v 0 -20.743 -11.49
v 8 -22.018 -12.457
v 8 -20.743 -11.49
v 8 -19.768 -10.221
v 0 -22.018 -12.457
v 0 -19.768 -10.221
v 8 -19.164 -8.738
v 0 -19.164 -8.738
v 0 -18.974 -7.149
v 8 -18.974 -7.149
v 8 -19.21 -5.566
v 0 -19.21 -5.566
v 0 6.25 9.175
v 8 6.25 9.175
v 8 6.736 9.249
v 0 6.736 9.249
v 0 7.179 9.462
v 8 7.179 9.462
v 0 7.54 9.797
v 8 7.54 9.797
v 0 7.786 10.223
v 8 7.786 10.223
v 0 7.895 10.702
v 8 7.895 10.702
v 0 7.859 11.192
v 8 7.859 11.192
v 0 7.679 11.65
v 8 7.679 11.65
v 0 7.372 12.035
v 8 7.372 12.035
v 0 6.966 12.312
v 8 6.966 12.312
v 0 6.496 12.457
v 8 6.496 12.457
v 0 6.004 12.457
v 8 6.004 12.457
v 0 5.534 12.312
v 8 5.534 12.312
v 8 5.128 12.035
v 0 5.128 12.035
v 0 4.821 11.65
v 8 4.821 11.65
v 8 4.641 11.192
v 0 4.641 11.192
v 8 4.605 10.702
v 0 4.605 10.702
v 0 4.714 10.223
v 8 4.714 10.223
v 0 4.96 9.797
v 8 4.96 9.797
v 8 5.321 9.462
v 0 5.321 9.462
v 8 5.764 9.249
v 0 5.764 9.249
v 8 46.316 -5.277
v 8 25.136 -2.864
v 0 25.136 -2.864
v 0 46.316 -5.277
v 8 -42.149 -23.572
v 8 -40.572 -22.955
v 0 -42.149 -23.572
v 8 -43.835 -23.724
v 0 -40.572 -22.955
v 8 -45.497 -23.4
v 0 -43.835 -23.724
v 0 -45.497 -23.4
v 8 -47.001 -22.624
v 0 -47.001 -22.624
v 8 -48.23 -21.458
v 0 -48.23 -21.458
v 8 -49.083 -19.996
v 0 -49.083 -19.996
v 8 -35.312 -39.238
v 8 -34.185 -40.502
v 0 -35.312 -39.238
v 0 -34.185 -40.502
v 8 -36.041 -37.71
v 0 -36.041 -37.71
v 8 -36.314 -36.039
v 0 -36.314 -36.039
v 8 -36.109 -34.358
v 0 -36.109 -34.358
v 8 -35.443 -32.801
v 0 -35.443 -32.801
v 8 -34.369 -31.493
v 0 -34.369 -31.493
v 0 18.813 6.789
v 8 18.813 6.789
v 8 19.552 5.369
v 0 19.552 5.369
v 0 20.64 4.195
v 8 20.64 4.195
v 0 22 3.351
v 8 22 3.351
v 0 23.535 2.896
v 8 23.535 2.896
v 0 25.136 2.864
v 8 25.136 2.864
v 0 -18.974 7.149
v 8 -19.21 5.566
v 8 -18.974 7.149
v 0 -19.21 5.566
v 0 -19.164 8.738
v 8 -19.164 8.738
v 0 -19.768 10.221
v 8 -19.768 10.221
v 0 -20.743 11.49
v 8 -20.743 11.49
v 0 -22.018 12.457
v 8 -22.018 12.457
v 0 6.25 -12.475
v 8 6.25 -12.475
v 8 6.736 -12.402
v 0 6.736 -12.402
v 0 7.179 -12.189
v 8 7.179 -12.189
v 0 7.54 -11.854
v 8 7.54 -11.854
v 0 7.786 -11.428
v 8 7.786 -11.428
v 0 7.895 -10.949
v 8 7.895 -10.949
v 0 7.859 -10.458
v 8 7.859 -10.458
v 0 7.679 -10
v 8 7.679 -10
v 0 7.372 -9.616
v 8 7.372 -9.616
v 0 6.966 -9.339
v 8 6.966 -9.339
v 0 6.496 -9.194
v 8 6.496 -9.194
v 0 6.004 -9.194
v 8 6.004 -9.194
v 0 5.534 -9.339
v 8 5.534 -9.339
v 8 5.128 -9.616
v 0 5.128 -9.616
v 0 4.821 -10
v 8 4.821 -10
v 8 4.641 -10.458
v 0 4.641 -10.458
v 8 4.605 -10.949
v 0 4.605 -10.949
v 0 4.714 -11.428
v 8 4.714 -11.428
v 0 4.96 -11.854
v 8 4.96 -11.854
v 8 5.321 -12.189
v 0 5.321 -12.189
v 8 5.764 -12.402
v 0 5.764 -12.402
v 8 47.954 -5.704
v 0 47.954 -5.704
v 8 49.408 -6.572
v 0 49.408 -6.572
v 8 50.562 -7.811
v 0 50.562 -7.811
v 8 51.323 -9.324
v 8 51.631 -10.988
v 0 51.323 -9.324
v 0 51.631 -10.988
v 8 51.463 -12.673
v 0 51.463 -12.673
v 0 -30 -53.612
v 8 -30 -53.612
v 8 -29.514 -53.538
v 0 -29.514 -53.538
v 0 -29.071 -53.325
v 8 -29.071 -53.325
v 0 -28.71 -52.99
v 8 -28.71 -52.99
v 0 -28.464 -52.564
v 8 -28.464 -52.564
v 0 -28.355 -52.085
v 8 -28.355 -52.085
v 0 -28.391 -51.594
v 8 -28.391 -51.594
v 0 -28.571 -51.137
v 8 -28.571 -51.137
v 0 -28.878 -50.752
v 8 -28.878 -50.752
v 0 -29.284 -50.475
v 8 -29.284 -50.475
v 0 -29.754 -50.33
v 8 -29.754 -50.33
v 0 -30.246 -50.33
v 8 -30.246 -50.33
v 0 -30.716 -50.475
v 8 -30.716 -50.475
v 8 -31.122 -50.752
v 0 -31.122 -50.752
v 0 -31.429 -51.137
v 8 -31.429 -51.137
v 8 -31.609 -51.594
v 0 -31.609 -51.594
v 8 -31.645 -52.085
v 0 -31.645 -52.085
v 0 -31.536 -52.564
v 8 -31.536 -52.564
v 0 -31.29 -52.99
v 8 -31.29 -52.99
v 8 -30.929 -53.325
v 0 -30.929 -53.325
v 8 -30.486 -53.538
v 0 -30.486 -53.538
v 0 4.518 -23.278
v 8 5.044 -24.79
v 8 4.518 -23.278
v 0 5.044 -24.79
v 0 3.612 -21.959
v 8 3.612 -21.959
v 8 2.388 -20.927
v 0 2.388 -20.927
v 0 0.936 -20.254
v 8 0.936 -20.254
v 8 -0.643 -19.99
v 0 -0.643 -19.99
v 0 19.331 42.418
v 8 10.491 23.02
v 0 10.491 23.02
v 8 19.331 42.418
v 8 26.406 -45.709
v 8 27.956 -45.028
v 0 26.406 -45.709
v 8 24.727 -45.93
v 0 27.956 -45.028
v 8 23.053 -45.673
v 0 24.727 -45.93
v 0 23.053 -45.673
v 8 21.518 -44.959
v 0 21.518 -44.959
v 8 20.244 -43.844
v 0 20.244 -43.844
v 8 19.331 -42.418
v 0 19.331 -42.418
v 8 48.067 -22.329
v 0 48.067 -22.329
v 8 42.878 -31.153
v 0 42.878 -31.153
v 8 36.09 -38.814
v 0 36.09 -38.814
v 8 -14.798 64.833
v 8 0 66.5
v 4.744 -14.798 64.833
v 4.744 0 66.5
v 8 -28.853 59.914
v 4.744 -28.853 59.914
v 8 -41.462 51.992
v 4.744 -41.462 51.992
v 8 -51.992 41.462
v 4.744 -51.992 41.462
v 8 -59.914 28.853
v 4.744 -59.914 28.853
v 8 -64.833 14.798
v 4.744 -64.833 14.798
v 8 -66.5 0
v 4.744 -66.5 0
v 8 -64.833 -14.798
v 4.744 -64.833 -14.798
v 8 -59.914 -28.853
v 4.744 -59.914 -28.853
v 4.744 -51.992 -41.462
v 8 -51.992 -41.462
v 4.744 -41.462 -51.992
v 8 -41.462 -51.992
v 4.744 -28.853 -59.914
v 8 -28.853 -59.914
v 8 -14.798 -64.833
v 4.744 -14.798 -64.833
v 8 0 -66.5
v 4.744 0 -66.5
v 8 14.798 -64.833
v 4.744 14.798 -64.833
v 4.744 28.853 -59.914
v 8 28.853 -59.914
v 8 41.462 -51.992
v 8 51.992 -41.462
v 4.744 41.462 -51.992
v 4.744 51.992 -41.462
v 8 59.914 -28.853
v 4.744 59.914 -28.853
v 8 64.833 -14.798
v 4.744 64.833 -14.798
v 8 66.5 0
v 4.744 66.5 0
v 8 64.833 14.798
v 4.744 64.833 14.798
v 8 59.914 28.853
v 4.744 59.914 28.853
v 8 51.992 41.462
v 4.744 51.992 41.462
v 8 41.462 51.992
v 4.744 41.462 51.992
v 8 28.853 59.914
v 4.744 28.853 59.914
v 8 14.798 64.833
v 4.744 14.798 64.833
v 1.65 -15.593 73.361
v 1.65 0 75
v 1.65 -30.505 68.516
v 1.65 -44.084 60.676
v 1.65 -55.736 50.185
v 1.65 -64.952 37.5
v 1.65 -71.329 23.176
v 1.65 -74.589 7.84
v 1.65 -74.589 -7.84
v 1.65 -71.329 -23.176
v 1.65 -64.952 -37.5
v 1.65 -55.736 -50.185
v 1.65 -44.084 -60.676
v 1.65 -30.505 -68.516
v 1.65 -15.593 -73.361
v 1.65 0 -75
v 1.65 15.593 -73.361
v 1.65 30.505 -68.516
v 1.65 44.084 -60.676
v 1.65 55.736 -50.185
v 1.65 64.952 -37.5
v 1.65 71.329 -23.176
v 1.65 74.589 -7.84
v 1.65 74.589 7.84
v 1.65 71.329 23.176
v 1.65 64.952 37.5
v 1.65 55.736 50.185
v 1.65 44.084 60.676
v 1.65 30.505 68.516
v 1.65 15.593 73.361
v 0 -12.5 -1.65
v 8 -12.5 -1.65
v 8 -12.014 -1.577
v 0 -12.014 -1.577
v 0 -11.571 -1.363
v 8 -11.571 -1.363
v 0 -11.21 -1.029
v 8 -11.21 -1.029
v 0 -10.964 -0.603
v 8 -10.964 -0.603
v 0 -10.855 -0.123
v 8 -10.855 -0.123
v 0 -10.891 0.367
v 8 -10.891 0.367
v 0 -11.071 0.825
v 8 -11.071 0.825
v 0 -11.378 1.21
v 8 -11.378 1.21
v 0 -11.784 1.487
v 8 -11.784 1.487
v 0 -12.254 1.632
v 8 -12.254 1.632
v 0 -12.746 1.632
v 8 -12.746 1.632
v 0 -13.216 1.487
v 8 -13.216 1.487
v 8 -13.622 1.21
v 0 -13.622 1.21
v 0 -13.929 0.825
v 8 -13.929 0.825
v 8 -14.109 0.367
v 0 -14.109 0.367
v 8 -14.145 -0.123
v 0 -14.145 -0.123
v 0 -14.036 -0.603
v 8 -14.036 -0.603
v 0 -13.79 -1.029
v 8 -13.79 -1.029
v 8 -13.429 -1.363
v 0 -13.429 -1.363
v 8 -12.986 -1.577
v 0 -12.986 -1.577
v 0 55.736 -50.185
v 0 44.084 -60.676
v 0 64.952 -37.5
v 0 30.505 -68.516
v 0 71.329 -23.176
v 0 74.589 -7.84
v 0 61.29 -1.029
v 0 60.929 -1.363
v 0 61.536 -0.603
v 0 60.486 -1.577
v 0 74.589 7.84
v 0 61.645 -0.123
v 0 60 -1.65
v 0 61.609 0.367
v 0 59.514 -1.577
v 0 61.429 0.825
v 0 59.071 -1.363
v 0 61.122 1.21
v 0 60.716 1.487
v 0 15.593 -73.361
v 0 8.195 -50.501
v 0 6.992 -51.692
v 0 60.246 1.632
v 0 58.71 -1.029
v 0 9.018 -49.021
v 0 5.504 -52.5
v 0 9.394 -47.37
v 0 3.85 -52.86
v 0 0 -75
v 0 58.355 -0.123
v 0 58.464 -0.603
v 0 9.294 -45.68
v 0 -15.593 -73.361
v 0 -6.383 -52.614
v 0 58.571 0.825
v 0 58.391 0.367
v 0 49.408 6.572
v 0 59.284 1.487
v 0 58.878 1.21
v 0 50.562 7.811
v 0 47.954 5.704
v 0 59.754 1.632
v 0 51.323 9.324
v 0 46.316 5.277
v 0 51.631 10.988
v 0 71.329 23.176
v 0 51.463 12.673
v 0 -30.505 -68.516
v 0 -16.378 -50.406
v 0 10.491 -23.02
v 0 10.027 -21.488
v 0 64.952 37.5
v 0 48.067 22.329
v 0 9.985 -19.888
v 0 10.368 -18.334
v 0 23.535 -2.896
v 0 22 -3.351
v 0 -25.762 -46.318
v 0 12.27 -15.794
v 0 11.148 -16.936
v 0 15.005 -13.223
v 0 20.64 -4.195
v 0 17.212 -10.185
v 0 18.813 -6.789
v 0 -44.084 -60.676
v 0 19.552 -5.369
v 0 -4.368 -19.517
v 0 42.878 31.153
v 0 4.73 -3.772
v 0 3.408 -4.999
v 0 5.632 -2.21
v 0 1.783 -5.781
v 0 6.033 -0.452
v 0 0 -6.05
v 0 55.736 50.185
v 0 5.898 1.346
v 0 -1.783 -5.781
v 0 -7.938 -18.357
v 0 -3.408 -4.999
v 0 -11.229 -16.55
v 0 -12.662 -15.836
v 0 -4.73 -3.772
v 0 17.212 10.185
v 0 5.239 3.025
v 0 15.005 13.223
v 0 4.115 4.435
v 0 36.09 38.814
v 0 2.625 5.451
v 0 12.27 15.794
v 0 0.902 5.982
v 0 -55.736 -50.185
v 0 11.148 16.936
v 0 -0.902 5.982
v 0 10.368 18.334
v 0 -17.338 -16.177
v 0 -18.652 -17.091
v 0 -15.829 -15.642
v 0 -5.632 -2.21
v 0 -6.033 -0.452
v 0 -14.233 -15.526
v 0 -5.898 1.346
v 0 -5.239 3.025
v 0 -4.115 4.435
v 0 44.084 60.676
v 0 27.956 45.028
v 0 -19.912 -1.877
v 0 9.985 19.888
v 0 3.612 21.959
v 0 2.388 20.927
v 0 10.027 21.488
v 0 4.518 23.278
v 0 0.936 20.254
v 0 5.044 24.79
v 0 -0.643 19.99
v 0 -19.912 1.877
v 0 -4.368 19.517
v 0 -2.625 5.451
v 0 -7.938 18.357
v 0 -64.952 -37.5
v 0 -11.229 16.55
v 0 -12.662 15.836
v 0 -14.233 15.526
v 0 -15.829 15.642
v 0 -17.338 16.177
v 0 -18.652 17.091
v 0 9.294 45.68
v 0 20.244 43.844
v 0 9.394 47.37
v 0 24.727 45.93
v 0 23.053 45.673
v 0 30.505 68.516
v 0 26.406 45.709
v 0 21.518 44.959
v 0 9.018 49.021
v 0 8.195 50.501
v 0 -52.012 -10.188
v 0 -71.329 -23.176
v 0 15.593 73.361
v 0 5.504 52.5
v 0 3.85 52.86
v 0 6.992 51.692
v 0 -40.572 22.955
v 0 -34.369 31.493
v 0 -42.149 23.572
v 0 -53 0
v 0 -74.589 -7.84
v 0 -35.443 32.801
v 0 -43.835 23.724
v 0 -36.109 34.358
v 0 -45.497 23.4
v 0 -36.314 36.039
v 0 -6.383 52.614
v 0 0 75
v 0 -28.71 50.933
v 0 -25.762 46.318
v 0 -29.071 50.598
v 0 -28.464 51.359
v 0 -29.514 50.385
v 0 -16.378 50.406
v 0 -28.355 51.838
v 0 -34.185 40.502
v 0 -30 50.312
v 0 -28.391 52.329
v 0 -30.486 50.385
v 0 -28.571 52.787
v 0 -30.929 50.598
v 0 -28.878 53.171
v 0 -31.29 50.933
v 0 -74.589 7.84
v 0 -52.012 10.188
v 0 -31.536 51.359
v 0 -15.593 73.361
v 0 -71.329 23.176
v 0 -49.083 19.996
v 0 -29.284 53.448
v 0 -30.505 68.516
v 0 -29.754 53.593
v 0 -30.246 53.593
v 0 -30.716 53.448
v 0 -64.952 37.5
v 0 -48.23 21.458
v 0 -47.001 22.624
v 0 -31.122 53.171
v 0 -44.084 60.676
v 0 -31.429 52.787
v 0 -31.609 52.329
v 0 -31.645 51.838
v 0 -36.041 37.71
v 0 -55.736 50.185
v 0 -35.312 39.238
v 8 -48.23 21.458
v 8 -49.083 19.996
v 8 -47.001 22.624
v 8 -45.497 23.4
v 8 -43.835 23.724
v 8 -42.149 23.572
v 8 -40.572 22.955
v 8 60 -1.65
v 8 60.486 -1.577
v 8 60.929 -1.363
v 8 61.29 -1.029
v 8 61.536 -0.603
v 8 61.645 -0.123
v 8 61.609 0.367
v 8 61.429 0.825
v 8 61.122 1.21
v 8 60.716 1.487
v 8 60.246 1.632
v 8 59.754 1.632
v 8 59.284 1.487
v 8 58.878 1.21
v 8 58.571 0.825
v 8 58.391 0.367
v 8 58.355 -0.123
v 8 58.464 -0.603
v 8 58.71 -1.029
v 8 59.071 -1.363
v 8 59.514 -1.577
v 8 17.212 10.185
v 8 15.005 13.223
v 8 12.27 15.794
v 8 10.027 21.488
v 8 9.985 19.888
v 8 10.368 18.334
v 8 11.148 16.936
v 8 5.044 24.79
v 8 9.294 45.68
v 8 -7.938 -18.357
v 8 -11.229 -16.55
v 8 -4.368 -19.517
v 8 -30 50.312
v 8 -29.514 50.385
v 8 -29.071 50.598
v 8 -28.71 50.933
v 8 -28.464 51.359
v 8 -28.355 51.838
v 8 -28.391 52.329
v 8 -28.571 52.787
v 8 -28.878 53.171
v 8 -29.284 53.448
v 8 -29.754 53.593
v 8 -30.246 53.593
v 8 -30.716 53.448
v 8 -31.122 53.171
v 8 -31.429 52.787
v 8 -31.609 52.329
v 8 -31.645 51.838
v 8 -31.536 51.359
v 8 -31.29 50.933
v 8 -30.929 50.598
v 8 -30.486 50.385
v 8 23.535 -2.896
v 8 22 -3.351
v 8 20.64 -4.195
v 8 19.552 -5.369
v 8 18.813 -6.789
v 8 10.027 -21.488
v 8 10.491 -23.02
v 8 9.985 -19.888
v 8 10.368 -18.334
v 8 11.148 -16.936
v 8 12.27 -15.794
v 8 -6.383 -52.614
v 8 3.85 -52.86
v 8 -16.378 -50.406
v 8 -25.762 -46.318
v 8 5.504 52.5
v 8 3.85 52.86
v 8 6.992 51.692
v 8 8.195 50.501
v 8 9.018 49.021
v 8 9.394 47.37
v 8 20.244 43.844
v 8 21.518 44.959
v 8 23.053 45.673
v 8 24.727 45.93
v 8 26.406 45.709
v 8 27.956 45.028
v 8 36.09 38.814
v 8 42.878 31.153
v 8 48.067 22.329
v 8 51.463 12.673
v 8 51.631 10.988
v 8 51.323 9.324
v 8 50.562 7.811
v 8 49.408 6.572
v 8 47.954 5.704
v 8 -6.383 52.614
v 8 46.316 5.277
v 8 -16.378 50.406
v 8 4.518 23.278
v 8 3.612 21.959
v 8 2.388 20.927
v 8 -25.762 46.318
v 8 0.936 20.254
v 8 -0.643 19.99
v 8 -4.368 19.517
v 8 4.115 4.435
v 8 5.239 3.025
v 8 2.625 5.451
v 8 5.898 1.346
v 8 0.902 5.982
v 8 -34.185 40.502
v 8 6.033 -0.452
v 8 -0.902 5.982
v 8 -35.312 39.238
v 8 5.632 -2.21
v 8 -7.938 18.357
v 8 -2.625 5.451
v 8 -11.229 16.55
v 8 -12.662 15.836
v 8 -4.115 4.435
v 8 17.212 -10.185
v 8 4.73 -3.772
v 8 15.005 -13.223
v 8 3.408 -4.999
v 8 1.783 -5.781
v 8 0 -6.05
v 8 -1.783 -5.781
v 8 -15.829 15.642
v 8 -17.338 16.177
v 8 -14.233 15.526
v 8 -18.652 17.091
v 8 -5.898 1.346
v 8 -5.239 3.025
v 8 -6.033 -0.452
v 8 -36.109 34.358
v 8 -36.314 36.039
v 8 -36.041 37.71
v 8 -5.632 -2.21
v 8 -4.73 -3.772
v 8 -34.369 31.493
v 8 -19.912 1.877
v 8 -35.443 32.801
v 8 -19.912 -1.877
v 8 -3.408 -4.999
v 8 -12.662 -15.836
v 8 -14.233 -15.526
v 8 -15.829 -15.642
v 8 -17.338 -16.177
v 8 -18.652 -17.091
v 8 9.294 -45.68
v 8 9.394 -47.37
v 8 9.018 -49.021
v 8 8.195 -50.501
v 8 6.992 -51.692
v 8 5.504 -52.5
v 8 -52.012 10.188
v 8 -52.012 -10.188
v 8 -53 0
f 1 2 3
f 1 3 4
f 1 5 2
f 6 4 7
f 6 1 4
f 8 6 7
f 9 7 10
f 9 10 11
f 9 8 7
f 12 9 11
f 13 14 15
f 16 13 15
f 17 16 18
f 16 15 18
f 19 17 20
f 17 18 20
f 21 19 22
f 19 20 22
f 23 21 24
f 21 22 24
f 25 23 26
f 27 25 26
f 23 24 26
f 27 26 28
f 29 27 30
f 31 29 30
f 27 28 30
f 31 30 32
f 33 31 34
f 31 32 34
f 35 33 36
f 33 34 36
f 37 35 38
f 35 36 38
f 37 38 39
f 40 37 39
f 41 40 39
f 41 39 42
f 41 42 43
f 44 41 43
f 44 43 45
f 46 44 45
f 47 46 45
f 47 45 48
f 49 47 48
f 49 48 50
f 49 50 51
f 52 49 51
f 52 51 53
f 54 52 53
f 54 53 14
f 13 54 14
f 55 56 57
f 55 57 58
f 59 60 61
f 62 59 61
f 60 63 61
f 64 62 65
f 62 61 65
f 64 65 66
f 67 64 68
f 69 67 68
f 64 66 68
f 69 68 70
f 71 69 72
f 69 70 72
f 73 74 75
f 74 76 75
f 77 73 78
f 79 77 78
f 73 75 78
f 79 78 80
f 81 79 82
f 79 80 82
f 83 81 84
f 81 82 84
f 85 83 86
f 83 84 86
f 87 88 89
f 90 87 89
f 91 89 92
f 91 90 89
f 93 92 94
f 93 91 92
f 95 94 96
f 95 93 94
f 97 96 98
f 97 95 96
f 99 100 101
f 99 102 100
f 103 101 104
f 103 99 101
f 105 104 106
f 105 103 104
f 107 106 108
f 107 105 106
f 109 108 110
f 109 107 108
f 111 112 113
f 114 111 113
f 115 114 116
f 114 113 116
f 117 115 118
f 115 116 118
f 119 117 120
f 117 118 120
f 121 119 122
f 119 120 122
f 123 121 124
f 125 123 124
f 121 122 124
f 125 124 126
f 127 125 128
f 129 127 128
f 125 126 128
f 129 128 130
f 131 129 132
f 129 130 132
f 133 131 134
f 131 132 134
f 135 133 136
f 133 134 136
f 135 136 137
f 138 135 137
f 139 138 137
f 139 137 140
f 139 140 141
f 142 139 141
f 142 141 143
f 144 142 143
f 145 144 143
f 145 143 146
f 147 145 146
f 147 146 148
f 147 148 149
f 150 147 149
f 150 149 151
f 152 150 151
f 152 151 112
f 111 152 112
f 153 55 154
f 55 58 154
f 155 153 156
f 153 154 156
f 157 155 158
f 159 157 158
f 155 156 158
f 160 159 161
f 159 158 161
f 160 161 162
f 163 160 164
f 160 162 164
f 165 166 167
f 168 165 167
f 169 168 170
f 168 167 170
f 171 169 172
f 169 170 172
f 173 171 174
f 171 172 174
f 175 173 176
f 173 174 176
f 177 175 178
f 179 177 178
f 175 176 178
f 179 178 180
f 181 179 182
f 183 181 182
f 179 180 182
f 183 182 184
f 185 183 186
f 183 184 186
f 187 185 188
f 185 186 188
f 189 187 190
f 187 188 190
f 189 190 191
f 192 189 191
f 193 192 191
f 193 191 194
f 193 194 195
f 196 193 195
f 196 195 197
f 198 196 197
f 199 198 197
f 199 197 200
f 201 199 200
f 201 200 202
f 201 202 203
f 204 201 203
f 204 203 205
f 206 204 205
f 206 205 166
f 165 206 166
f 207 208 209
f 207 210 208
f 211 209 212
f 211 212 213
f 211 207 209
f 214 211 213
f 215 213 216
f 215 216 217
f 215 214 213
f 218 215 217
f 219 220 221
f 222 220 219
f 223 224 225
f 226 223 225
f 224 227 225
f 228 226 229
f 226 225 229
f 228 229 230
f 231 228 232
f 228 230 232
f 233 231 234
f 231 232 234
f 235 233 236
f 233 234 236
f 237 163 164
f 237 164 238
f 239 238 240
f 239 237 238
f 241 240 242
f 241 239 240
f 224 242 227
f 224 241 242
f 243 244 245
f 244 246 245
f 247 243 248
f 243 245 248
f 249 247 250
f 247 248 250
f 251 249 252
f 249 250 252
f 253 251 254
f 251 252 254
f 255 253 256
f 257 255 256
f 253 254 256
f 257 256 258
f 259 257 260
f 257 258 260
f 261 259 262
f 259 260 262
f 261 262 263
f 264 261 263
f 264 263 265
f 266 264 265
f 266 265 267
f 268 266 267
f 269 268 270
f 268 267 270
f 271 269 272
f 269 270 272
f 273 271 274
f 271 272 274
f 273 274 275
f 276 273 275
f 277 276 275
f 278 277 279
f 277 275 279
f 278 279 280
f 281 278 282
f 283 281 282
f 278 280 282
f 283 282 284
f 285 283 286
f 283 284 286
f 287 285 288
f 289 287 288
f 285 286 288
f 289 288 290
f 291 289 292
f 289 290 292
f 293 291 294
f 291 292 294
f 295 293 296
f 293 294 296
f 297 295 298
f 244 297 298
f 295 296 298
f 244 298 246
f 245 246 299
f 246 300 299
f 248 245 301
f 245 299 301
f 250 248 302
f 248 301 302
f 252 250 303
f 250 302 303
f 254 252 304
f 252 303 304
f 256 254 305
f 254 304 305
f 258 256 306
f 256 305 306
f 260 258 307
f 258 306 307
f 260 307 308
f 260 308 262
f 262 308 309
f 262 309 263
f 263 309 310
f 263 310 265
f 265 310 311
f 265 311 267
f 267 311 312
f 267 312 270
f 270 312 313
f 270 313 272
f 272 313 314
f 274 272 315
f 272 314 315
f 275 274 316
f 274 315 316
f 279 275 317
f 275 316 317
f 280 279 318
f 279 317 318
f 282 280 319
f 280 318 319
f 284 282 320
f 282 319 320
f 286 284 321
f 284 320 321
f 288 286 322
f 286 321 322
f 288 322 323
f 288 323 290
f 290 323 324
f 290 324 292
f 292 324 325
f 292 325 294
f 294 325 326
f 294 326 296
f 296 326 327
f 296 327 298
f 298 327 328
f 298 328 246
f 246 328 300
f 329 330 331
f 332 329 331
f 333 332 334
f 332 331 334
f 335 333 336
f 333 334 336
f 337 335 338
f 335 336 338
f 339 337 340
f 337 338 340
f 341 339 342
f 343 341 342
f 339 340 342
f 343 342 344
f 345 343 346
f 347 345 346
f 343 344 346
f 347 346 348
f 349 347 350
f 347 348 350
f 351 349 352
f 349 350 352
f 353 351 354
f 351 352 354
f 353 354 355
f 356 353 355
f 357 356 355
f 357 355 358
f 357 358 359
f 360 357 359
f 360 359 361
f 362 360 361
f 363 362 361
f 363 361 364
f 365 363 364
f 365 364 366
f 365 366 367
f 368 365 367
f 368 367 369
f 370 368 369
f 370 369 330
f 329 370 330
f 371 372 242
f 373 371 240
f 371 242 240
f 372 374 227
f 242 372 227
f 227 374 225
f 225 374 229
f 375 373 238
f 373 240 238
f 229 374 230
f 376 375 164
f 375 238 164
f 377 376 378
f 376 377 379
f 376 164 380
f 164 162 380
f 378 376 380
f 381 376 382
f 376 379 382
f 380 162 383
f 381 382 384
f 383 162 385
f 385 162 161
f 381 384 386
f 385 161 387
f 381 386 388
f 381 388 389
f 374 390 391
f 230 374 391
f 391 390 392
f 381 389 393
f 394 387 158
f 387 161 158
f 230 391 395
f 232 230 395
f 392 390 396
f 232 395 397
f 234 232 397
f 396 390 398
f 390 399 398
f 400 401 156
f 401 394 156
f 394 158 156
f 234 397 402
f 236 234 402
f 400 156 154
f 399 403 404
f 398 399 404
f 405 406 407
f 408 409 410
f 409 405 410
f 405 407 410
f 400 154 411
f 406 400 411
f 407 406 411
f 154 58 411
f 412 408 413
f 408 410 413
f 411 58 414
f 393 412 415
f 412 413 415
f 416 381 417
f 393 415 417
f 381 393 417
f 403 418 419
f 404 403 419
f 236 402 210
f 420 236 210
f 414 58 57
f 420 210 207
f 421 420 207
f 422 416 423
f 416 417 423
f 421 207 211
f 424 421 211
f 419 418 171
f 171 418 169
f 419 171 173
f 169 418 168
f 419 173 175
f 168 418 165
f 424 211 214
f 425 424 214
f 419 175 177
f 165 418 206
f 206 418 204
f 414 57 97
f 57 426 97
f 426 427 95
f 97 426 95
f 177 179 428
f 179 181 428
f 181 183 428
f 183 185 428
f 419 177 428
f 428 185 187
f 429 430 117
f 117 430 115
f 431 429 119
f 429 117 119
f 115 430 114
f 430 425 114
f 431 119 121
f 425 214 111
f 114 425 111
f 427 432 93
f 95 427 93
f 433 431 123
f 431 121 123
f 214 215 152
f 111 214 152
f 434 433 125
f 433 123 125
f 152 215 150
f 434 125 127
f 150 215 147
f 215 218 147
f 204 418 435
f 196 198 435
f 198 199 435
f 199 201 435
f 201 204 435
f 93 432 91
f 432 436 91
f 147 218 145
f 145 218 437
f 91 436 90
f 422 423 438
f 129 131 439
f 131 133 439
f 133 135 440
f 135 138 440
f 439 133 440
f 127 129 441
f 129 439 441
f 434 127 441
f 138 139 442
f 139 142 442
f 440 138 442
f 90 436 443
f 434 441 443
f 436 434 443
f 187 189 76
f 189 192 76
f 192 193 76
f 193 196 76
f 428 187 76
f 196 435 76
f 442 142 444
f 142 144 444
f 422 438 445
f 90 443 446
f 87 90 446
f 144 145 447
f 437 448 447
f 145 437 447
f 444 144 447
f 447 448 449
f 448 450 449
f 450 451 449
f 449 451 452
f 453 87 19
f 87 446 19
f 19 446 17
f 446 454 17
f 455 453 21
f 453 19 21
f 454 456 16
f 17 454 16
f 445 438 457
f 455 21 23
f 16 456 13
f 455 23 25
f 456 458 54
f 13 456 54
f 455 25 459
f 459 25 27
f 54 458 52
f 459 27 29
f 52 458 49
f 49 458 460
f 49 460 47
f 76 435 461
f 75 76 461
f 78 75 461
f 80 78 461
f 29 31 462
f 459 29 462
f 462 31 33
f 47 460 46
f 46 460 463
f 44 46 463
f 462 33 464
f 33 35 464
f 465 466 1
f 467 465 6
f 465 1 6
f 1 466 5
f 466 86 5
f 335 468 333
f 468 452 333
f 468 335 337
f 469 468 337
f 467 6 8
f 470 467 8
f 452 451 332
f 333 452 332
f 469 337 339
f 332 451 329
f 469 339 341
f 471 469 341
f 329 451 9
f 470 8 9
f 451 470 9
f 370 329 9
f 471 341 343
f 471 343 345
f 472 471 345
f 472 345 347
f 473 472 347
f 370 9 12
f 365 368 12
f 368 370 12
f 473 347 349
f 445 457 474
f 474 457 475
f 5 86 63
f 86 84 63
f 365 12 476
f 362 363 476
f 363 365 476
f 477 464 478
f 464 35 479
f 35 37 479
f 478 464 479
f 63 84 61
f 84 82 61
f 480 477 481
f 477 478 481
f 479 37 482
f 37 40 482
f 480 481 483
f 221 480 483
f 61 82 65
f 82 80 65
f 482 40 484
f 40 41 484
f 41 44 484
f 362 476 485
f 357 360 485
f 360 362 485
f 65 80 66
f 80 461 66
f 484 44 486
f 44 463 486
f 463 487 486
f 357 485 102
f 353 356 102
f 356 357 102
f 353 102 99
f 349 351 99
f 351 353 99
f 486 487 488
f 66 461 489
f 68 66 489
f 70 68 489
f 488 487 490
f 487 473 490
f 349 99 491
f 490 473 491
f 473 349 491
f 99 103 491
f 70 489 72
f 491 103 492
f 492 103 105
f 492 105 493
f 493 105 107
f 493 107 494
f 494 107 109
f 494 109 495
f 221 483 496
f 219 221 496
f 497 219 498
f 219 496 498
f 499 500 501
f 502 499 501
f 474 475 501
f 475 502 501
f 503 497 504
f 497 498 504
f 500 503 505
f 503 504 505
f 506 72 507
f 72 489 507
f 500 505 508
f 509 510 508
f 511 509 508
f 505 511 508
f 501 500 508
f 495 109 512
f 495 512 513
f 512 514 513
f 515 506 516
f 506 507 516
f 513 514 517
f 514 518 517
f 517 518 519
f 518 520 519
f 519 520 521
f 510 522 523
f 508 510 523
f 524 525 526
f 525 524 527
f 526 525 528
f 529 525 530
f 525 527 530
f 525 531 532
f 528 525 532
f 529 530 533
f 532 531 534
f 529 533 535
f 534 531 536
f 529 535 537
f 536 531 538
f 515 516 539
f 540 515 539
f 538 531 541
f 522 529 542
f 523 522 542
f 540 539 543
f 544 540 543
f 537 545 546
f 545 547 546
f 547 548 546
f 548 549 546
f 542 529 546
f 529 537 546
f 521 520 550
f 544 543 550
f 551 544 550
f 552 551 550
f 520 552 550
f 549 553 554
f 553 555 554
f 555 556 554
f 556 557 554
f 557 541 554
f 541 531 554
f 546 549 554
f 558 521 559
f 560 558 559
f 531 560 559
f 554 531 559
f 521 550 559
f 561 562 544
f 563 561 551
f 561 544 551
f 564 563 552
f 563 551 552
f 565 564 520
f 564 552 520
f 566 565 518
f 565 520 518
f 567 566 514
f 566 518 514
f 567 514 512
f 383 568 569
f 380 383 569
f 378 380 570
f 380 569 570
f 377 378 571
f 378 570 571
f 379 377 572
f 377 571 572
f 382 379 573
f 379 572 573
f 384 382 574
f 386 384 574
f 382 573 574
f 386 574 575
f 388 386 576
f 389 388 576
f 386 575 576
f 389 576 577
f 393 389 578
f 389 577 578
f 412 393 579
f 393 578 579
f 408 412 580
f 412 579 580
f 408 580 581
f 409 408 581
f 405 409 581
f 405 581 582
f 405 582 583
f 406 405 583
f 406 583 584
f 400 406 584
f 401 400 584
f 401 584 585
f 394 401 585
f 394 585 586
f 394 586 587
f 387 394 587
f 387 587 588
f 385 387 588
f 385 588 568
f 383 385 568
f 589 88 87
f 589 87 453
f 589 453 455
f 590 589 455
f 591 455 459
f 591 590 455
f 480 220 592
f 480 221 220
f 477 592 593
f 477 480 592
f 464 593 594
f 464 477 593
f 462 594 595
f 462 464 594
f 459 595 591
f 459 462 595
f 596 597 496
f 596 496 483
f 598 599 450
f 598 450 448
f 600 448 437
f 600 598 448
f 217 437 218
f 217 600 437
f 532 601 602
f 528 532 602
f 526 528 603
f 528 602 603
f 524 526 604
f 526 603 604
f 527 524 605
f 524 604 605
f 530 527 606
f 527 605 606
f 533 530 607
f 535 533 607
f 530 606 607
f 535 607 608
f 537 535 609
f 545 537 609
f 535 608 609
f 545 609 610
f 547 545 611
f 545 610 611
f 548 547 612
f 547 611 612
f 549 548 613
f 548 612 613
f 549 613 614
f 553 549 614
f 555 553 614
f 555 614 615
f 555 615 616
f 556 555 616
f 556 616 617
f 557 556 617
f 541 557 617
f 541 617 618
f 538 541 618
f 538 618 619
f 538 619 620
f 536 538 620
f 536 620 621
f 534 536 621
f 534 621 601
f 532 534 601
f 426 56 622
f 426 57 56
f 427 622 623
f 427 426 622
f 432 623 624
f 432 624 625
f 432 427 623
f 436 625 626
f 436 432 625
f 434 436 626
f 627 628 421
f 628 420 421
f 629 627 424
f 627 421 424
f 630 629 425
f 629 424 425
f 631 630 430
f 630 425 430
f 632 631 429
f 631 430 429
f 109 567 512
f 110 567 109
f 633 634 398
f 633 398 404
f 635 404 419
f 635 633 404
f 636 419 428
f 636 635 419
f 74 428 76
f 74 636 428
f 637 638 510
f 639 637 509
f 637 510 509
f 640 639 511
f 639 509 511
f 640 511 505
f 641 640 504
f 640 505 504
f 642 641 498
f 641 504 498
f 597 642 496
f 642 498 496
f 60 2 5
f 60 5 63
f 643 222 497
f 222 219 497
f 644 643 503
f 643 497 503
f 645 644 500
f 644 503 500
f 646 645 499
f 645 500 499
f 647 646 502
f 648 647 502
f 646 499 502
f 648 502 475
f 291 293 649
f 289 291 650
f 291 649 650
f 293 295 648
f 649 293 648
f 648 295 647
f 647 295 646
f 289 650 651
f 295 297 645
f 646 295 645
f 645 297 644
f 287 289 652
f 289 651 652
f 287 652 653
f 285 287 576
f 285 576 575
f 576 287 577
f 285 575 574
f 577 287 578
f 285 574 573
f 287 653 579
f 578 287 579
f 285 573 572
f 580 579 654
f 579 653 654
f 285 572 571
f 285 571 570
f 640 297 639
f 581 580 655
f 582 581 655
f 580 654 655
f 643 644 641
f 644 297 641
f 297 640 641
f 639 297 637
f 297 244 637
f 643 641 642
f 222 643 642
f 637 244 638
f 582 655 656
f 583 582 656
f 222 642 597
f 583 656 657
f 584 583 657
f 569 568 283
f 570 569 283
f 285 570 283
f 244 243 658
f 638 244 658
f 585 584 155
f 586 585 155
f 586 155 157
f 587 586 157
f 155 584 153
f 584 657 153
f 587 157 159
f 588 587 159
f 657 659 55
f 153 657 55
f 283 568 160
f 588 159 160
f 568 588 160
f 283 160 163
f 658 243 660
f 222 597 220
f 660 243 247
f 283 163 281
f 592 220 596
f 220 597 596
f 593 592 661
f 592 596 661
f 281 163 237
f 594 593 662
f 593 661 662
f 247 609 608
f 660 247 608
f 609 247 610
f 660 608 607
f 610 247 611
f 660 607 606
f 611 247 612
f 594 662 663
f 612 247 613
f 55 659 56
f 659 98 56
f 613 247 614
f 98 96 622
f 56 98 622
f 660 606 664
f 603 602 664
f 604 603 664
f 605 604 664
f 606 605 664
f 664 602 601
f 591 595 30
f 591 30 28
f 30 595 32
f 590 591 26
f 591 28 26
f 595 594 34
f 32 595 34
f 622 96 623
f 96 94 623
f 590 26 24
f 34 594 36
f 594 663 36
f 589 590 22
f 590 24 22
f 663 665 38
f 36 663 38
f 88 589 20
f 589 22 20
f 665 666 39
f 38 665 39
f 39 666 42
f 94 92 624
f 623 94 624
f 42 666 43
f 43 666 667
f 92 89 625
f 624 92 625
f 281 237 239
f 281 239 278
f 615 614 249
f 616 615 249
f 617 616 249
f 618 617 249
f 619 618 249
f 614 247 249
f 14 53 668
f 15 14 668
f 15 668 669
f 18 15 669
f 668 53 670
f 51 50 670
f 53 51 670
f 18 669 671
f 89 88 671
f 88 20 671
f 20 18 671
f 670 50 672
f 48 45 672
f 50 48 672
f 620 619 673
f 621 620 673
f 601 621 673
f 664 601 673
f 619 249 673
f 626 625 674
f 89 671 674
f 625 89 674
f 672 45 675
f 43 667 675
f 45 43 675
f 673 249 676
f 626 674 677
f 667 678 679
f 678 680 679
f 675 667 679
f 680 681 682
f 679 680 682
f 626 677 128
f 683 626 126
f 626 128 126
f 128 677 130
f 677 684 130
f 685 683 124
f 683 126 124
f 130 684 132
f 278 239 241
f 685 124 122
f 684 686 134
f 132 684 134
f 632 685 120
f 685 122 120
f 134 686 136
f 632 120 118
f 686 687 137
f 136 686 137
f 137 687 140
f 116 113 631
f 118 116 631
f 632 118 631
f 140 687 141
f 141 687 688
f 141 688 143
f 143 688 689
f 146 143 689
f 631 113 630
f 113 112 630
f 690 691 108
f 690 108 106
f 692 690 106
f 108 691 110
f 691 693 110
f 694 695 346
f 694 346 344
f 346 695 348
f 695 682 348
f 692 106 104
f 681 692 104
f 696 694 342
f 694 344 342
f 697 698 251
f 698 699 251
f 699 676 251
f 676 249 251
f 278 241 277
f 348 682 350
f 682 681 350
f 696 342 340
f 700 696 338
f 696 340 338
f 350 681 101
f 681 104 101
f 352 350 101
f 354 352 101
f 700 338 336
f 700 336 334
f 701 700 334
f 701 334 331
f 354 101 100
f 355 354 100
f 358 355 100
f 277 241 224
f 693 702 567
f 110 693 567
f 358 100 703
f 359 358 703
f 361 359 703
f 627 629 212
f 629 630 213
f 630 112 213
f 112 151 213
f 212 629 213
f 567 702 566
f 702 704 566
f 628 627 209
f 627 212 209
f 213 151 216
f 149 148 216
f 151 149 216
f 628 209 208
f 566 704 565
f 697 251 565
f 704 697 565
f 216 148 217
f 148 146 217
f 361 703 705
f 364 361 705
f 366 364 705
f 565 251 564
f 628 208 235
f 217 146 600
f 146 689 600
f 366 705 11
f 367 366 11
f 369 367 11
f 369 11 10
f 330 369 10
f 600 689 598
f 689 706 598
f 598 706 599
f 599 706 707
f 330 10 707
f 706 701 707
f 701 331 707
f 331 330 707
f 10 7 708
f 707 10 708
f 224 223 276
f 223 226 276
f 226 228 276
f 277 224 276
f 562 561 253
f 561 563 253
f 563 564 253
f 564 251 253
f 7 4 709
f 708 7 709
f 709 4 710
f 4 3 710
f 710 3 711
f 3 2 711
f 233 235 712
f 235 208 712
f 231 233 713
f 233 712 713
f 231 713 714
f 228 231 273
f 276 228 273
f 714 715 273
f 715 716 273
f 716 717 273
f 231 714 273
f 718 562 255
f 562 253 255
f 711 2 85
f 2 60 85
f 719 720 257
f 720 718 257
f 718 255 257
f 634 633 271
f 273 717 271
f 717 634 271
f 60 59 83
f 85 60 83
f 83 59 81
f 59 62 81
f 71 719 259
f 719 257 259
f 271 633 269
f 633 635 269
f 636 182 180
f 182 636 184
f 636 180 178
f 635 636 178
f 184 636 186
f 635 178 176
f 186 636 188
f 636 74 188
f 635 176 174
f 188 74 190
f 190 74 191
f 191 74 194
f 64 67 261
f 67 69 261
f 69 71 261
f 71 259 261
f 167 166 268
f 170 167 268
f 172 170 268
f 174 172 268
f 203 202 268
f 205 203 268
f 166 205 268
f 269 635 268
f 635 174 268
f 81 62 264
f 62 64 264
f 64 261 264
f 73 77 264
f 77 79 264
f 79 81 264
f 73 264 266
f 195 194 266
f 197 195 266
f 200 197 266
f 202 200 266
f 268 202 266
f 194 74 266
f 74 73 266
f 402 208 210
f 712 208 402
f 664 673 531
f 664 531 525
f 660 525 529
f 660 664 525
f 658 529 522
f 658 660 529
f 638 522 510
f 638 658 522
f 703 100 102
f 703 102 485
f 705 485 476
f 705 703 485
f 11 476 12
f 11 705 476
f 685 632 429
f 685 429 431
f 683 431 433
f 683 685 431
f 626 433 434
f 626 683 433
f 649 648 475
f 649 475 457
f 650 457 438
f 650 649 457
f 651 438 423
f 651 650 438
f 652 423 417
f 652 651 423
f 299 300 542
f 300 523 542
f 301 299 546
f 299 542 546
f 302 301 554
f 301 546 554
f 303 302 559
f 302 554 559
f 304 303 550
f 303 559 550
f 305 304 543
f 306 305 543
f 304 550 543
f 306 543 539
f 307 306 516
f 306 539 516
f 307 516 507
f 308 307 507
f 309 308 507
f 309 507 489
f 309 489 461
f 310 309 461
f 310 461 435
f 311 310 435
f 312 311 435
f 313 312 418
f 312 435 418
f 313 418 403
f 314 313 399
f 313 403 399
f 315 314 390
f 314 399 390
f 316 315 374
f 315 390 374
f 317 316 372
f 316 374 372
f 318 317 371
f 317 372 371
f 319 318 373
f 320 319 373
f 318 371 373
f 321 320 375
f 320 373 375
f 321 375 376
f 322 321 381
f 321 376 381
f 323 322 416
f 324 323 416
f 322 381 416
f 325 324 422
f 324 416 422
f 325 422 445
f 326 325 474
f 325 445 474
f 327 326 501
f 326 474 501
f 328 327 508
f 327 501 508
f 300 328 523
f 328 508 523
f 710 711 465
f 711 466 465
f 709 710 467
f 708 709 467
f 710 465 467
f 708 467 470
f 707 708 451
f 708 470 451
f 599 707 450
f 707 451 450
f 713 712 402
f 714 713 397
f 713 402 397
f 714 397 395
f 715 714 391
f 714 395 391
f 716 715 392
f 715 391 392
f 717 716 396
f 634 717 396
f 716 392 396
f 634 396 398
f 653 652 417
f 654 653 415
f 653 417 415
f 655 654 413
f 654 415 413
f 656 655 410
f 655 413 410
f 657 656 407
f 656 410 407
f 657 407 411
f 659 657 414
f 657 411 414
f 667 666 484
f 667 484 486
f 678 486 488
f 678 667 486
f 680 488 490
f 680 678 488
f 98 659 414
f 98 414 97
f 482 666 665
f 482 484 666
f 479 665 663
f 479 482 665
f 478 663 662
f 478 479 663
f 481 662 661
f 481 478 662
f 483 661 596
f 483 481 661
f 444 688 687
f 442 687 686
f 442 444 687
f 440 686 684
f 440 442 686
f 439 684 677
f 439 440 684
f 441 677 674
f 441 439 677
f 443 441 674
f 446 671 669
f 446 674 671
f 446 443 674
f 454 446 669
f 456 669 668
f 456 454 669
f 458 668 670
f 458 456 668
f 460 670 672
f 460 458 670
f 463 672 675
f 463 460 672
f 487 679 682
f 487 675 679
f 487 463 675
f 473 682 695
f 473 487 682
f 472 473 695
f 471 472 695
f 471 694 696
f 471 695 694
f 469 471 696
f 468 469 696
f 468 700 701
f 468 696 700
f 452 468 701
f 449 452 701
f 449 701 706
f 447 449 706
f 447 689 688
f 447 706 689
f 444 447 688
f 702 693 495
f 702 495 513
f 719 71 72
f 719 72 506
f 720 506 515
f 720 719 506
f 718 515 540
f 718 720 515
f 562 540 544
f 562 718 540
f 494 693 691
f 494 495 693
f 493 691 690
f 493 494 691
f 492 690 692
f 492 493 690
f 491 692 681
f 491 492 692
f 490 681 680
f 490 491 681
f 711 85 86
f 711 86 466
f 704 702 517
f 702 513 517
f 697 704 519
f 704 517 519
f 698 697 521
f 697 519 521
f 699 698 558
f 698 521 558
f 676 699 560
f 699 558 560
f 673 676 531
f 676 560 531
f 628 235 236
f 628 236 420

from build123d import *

# Parameters (mm, degrees)
SKETCH5_R                = 6.05
CUT_EXTRUDE1_DEPTH       = 107.367288205
SKETCH7_R                = 1.65
CUT_EXTRUDE3_DEPTH       = 107.367288205
CUT_EXTRUDE4_DEPTH       = 107.367288205
FILLET1_R                = 6
CIRPATTERN1_COUNT        = 5
FILLET1_OF_CIRPATTERN1_R = 6


with BuildPart() as part:
    # Sketch3 → Revolve1 (revolve)
    with BuildSketch(Plane.XY):
        Polygon((0, 0), (8, 0), (8, 66.5), (4.743746991, 66.5), (1.65, 75), (0, 75), align=None)
    revolve(axis=Axis((0, 0, 0), (1, 0, 0)))

    # Sketch5 → Cut-Extrude1 (cut, through all)
    with BuildSketch(Plane(origin=(0, 0, 0), x_dir=(0, 0, -1), z_dir=(1, 0, 0))):
        Circle(SKETCH5_R)
    extrude(amount=CUT_EXTRUDE1_DEPTH, mode=Mode.SUBTRACT)

    # Sketch7 → Cut-Extrude3 (cut, through all)
    with BuildSketch(Plane(origin=(8, 0, 0), x_dir=(0, 0, -1), z_dir=(1, 0, 0))):
        with Locations((0, 60)):
            Circle(SKETCH7_R)
        with Locations((51.961524227, -30)):
            Circle(SKETCH7_R)
        with Locations((-51.961524227, -30)):
            Circle(SKETCH7_R)
        with Locations((10.825317547, 6.25)):
            Circle(SKETCH7_R)
        with Locations((0, -12.5)):
            Circle(SKETCH7_R)
        with Locations((-10.825317547, 6.25)):
            Circle(SKETCH7_R)
    extrude(amount=-CUT_EXTRUDE3_DEPTH, mode=Mode.SUBTRACT)

    # Sketch8 → Cut-Extrude4 (cut, through all)
    with BuildSketch(Plane(origin=(8, 0, 0), x_dir=(0, 0, -1), z_dir=(1, 0, 0))):
        with BuildLine():
            Line((2.264064275, 19.871437114), (5.99977033, 52.659308351))
            ThreePointArc((5.99977033, 52.659308351), (31.152618372, 42.877900702), (48.227947356, 21.978741861))
            Line((48.227947356, 21.978741861), (18.199225418, 8.293864853))
            ThreePointArc((18.199225418, 8.293864853), (11.755705046, 16.180339887), (2.264064275, 19.871437114))
        make_face()
    cut_extrude4 = extrude(amount=-CUT_EXTRUDE4_DEPTH, mode=Mode.SUBTRACT)

    # Fillet1
    fillet1_edges = [part.edges().sort_by_distance(p)[0] for p in [
        (4, 21.978741861, -48.227947356),
        (4, 52.659308351, -5.99977033),
        (4, 8.293864853, -18.199225418),
        (4, 19.871437114, -2.264064275),
    ]]
    fillet(fillet1_edges, radius=FILLET1_R)

    # CirPattern1: Cut-Extrude4 ×5 about axis
    cirpattern1_axis = Axis((8, 0, 0), (-1, 0, 0))
    for i in range(1, CIRPATTERN1_COUNT):
        add(cut_extrude4.rotate(cirpattern1_axis, i * 360 / CIRPATTERN1_COUNT), mode=Mode.SUBTRACT)

    # Fillet1 of CirPattern1
    fillet1_of_cirpattern1_edges = [part.edges().sort_by_distance(p)[0] for p in [
        (4, -39.075698851, -35.806281004),
        (4, 10.566500524, -51.936009345),
        (4, -14.745546736, -13.511804152),
        (4, 3.987358688, -19.598494092),
        (4, -46.128851885, 26.098448685),
        (4, -46.128851885, -26.098448685),
        (4, -17.407113919, 9.848471202),
        (4, -17.407113919, -9.848471202),
        (4, 10.566500524, 51.936009345),
        (4, -39.075698851, 35.806281004),
        (4, 3.987358688, 19.598494092),
        (4, -14.745546736, 13.511804152),
        (4, 52.659308351, 5.99977033),
        (4, 21.978741861, 48.227947356),
        (4, 19.871437114, 2.264064275),
        (4, 8.293864853, 18.199225418),
    ]]
    fillet(fillet1_of_cirpattern1_edges, radius=FILLET1_OF_CIRPATTERN1_R)


solid = part.part
